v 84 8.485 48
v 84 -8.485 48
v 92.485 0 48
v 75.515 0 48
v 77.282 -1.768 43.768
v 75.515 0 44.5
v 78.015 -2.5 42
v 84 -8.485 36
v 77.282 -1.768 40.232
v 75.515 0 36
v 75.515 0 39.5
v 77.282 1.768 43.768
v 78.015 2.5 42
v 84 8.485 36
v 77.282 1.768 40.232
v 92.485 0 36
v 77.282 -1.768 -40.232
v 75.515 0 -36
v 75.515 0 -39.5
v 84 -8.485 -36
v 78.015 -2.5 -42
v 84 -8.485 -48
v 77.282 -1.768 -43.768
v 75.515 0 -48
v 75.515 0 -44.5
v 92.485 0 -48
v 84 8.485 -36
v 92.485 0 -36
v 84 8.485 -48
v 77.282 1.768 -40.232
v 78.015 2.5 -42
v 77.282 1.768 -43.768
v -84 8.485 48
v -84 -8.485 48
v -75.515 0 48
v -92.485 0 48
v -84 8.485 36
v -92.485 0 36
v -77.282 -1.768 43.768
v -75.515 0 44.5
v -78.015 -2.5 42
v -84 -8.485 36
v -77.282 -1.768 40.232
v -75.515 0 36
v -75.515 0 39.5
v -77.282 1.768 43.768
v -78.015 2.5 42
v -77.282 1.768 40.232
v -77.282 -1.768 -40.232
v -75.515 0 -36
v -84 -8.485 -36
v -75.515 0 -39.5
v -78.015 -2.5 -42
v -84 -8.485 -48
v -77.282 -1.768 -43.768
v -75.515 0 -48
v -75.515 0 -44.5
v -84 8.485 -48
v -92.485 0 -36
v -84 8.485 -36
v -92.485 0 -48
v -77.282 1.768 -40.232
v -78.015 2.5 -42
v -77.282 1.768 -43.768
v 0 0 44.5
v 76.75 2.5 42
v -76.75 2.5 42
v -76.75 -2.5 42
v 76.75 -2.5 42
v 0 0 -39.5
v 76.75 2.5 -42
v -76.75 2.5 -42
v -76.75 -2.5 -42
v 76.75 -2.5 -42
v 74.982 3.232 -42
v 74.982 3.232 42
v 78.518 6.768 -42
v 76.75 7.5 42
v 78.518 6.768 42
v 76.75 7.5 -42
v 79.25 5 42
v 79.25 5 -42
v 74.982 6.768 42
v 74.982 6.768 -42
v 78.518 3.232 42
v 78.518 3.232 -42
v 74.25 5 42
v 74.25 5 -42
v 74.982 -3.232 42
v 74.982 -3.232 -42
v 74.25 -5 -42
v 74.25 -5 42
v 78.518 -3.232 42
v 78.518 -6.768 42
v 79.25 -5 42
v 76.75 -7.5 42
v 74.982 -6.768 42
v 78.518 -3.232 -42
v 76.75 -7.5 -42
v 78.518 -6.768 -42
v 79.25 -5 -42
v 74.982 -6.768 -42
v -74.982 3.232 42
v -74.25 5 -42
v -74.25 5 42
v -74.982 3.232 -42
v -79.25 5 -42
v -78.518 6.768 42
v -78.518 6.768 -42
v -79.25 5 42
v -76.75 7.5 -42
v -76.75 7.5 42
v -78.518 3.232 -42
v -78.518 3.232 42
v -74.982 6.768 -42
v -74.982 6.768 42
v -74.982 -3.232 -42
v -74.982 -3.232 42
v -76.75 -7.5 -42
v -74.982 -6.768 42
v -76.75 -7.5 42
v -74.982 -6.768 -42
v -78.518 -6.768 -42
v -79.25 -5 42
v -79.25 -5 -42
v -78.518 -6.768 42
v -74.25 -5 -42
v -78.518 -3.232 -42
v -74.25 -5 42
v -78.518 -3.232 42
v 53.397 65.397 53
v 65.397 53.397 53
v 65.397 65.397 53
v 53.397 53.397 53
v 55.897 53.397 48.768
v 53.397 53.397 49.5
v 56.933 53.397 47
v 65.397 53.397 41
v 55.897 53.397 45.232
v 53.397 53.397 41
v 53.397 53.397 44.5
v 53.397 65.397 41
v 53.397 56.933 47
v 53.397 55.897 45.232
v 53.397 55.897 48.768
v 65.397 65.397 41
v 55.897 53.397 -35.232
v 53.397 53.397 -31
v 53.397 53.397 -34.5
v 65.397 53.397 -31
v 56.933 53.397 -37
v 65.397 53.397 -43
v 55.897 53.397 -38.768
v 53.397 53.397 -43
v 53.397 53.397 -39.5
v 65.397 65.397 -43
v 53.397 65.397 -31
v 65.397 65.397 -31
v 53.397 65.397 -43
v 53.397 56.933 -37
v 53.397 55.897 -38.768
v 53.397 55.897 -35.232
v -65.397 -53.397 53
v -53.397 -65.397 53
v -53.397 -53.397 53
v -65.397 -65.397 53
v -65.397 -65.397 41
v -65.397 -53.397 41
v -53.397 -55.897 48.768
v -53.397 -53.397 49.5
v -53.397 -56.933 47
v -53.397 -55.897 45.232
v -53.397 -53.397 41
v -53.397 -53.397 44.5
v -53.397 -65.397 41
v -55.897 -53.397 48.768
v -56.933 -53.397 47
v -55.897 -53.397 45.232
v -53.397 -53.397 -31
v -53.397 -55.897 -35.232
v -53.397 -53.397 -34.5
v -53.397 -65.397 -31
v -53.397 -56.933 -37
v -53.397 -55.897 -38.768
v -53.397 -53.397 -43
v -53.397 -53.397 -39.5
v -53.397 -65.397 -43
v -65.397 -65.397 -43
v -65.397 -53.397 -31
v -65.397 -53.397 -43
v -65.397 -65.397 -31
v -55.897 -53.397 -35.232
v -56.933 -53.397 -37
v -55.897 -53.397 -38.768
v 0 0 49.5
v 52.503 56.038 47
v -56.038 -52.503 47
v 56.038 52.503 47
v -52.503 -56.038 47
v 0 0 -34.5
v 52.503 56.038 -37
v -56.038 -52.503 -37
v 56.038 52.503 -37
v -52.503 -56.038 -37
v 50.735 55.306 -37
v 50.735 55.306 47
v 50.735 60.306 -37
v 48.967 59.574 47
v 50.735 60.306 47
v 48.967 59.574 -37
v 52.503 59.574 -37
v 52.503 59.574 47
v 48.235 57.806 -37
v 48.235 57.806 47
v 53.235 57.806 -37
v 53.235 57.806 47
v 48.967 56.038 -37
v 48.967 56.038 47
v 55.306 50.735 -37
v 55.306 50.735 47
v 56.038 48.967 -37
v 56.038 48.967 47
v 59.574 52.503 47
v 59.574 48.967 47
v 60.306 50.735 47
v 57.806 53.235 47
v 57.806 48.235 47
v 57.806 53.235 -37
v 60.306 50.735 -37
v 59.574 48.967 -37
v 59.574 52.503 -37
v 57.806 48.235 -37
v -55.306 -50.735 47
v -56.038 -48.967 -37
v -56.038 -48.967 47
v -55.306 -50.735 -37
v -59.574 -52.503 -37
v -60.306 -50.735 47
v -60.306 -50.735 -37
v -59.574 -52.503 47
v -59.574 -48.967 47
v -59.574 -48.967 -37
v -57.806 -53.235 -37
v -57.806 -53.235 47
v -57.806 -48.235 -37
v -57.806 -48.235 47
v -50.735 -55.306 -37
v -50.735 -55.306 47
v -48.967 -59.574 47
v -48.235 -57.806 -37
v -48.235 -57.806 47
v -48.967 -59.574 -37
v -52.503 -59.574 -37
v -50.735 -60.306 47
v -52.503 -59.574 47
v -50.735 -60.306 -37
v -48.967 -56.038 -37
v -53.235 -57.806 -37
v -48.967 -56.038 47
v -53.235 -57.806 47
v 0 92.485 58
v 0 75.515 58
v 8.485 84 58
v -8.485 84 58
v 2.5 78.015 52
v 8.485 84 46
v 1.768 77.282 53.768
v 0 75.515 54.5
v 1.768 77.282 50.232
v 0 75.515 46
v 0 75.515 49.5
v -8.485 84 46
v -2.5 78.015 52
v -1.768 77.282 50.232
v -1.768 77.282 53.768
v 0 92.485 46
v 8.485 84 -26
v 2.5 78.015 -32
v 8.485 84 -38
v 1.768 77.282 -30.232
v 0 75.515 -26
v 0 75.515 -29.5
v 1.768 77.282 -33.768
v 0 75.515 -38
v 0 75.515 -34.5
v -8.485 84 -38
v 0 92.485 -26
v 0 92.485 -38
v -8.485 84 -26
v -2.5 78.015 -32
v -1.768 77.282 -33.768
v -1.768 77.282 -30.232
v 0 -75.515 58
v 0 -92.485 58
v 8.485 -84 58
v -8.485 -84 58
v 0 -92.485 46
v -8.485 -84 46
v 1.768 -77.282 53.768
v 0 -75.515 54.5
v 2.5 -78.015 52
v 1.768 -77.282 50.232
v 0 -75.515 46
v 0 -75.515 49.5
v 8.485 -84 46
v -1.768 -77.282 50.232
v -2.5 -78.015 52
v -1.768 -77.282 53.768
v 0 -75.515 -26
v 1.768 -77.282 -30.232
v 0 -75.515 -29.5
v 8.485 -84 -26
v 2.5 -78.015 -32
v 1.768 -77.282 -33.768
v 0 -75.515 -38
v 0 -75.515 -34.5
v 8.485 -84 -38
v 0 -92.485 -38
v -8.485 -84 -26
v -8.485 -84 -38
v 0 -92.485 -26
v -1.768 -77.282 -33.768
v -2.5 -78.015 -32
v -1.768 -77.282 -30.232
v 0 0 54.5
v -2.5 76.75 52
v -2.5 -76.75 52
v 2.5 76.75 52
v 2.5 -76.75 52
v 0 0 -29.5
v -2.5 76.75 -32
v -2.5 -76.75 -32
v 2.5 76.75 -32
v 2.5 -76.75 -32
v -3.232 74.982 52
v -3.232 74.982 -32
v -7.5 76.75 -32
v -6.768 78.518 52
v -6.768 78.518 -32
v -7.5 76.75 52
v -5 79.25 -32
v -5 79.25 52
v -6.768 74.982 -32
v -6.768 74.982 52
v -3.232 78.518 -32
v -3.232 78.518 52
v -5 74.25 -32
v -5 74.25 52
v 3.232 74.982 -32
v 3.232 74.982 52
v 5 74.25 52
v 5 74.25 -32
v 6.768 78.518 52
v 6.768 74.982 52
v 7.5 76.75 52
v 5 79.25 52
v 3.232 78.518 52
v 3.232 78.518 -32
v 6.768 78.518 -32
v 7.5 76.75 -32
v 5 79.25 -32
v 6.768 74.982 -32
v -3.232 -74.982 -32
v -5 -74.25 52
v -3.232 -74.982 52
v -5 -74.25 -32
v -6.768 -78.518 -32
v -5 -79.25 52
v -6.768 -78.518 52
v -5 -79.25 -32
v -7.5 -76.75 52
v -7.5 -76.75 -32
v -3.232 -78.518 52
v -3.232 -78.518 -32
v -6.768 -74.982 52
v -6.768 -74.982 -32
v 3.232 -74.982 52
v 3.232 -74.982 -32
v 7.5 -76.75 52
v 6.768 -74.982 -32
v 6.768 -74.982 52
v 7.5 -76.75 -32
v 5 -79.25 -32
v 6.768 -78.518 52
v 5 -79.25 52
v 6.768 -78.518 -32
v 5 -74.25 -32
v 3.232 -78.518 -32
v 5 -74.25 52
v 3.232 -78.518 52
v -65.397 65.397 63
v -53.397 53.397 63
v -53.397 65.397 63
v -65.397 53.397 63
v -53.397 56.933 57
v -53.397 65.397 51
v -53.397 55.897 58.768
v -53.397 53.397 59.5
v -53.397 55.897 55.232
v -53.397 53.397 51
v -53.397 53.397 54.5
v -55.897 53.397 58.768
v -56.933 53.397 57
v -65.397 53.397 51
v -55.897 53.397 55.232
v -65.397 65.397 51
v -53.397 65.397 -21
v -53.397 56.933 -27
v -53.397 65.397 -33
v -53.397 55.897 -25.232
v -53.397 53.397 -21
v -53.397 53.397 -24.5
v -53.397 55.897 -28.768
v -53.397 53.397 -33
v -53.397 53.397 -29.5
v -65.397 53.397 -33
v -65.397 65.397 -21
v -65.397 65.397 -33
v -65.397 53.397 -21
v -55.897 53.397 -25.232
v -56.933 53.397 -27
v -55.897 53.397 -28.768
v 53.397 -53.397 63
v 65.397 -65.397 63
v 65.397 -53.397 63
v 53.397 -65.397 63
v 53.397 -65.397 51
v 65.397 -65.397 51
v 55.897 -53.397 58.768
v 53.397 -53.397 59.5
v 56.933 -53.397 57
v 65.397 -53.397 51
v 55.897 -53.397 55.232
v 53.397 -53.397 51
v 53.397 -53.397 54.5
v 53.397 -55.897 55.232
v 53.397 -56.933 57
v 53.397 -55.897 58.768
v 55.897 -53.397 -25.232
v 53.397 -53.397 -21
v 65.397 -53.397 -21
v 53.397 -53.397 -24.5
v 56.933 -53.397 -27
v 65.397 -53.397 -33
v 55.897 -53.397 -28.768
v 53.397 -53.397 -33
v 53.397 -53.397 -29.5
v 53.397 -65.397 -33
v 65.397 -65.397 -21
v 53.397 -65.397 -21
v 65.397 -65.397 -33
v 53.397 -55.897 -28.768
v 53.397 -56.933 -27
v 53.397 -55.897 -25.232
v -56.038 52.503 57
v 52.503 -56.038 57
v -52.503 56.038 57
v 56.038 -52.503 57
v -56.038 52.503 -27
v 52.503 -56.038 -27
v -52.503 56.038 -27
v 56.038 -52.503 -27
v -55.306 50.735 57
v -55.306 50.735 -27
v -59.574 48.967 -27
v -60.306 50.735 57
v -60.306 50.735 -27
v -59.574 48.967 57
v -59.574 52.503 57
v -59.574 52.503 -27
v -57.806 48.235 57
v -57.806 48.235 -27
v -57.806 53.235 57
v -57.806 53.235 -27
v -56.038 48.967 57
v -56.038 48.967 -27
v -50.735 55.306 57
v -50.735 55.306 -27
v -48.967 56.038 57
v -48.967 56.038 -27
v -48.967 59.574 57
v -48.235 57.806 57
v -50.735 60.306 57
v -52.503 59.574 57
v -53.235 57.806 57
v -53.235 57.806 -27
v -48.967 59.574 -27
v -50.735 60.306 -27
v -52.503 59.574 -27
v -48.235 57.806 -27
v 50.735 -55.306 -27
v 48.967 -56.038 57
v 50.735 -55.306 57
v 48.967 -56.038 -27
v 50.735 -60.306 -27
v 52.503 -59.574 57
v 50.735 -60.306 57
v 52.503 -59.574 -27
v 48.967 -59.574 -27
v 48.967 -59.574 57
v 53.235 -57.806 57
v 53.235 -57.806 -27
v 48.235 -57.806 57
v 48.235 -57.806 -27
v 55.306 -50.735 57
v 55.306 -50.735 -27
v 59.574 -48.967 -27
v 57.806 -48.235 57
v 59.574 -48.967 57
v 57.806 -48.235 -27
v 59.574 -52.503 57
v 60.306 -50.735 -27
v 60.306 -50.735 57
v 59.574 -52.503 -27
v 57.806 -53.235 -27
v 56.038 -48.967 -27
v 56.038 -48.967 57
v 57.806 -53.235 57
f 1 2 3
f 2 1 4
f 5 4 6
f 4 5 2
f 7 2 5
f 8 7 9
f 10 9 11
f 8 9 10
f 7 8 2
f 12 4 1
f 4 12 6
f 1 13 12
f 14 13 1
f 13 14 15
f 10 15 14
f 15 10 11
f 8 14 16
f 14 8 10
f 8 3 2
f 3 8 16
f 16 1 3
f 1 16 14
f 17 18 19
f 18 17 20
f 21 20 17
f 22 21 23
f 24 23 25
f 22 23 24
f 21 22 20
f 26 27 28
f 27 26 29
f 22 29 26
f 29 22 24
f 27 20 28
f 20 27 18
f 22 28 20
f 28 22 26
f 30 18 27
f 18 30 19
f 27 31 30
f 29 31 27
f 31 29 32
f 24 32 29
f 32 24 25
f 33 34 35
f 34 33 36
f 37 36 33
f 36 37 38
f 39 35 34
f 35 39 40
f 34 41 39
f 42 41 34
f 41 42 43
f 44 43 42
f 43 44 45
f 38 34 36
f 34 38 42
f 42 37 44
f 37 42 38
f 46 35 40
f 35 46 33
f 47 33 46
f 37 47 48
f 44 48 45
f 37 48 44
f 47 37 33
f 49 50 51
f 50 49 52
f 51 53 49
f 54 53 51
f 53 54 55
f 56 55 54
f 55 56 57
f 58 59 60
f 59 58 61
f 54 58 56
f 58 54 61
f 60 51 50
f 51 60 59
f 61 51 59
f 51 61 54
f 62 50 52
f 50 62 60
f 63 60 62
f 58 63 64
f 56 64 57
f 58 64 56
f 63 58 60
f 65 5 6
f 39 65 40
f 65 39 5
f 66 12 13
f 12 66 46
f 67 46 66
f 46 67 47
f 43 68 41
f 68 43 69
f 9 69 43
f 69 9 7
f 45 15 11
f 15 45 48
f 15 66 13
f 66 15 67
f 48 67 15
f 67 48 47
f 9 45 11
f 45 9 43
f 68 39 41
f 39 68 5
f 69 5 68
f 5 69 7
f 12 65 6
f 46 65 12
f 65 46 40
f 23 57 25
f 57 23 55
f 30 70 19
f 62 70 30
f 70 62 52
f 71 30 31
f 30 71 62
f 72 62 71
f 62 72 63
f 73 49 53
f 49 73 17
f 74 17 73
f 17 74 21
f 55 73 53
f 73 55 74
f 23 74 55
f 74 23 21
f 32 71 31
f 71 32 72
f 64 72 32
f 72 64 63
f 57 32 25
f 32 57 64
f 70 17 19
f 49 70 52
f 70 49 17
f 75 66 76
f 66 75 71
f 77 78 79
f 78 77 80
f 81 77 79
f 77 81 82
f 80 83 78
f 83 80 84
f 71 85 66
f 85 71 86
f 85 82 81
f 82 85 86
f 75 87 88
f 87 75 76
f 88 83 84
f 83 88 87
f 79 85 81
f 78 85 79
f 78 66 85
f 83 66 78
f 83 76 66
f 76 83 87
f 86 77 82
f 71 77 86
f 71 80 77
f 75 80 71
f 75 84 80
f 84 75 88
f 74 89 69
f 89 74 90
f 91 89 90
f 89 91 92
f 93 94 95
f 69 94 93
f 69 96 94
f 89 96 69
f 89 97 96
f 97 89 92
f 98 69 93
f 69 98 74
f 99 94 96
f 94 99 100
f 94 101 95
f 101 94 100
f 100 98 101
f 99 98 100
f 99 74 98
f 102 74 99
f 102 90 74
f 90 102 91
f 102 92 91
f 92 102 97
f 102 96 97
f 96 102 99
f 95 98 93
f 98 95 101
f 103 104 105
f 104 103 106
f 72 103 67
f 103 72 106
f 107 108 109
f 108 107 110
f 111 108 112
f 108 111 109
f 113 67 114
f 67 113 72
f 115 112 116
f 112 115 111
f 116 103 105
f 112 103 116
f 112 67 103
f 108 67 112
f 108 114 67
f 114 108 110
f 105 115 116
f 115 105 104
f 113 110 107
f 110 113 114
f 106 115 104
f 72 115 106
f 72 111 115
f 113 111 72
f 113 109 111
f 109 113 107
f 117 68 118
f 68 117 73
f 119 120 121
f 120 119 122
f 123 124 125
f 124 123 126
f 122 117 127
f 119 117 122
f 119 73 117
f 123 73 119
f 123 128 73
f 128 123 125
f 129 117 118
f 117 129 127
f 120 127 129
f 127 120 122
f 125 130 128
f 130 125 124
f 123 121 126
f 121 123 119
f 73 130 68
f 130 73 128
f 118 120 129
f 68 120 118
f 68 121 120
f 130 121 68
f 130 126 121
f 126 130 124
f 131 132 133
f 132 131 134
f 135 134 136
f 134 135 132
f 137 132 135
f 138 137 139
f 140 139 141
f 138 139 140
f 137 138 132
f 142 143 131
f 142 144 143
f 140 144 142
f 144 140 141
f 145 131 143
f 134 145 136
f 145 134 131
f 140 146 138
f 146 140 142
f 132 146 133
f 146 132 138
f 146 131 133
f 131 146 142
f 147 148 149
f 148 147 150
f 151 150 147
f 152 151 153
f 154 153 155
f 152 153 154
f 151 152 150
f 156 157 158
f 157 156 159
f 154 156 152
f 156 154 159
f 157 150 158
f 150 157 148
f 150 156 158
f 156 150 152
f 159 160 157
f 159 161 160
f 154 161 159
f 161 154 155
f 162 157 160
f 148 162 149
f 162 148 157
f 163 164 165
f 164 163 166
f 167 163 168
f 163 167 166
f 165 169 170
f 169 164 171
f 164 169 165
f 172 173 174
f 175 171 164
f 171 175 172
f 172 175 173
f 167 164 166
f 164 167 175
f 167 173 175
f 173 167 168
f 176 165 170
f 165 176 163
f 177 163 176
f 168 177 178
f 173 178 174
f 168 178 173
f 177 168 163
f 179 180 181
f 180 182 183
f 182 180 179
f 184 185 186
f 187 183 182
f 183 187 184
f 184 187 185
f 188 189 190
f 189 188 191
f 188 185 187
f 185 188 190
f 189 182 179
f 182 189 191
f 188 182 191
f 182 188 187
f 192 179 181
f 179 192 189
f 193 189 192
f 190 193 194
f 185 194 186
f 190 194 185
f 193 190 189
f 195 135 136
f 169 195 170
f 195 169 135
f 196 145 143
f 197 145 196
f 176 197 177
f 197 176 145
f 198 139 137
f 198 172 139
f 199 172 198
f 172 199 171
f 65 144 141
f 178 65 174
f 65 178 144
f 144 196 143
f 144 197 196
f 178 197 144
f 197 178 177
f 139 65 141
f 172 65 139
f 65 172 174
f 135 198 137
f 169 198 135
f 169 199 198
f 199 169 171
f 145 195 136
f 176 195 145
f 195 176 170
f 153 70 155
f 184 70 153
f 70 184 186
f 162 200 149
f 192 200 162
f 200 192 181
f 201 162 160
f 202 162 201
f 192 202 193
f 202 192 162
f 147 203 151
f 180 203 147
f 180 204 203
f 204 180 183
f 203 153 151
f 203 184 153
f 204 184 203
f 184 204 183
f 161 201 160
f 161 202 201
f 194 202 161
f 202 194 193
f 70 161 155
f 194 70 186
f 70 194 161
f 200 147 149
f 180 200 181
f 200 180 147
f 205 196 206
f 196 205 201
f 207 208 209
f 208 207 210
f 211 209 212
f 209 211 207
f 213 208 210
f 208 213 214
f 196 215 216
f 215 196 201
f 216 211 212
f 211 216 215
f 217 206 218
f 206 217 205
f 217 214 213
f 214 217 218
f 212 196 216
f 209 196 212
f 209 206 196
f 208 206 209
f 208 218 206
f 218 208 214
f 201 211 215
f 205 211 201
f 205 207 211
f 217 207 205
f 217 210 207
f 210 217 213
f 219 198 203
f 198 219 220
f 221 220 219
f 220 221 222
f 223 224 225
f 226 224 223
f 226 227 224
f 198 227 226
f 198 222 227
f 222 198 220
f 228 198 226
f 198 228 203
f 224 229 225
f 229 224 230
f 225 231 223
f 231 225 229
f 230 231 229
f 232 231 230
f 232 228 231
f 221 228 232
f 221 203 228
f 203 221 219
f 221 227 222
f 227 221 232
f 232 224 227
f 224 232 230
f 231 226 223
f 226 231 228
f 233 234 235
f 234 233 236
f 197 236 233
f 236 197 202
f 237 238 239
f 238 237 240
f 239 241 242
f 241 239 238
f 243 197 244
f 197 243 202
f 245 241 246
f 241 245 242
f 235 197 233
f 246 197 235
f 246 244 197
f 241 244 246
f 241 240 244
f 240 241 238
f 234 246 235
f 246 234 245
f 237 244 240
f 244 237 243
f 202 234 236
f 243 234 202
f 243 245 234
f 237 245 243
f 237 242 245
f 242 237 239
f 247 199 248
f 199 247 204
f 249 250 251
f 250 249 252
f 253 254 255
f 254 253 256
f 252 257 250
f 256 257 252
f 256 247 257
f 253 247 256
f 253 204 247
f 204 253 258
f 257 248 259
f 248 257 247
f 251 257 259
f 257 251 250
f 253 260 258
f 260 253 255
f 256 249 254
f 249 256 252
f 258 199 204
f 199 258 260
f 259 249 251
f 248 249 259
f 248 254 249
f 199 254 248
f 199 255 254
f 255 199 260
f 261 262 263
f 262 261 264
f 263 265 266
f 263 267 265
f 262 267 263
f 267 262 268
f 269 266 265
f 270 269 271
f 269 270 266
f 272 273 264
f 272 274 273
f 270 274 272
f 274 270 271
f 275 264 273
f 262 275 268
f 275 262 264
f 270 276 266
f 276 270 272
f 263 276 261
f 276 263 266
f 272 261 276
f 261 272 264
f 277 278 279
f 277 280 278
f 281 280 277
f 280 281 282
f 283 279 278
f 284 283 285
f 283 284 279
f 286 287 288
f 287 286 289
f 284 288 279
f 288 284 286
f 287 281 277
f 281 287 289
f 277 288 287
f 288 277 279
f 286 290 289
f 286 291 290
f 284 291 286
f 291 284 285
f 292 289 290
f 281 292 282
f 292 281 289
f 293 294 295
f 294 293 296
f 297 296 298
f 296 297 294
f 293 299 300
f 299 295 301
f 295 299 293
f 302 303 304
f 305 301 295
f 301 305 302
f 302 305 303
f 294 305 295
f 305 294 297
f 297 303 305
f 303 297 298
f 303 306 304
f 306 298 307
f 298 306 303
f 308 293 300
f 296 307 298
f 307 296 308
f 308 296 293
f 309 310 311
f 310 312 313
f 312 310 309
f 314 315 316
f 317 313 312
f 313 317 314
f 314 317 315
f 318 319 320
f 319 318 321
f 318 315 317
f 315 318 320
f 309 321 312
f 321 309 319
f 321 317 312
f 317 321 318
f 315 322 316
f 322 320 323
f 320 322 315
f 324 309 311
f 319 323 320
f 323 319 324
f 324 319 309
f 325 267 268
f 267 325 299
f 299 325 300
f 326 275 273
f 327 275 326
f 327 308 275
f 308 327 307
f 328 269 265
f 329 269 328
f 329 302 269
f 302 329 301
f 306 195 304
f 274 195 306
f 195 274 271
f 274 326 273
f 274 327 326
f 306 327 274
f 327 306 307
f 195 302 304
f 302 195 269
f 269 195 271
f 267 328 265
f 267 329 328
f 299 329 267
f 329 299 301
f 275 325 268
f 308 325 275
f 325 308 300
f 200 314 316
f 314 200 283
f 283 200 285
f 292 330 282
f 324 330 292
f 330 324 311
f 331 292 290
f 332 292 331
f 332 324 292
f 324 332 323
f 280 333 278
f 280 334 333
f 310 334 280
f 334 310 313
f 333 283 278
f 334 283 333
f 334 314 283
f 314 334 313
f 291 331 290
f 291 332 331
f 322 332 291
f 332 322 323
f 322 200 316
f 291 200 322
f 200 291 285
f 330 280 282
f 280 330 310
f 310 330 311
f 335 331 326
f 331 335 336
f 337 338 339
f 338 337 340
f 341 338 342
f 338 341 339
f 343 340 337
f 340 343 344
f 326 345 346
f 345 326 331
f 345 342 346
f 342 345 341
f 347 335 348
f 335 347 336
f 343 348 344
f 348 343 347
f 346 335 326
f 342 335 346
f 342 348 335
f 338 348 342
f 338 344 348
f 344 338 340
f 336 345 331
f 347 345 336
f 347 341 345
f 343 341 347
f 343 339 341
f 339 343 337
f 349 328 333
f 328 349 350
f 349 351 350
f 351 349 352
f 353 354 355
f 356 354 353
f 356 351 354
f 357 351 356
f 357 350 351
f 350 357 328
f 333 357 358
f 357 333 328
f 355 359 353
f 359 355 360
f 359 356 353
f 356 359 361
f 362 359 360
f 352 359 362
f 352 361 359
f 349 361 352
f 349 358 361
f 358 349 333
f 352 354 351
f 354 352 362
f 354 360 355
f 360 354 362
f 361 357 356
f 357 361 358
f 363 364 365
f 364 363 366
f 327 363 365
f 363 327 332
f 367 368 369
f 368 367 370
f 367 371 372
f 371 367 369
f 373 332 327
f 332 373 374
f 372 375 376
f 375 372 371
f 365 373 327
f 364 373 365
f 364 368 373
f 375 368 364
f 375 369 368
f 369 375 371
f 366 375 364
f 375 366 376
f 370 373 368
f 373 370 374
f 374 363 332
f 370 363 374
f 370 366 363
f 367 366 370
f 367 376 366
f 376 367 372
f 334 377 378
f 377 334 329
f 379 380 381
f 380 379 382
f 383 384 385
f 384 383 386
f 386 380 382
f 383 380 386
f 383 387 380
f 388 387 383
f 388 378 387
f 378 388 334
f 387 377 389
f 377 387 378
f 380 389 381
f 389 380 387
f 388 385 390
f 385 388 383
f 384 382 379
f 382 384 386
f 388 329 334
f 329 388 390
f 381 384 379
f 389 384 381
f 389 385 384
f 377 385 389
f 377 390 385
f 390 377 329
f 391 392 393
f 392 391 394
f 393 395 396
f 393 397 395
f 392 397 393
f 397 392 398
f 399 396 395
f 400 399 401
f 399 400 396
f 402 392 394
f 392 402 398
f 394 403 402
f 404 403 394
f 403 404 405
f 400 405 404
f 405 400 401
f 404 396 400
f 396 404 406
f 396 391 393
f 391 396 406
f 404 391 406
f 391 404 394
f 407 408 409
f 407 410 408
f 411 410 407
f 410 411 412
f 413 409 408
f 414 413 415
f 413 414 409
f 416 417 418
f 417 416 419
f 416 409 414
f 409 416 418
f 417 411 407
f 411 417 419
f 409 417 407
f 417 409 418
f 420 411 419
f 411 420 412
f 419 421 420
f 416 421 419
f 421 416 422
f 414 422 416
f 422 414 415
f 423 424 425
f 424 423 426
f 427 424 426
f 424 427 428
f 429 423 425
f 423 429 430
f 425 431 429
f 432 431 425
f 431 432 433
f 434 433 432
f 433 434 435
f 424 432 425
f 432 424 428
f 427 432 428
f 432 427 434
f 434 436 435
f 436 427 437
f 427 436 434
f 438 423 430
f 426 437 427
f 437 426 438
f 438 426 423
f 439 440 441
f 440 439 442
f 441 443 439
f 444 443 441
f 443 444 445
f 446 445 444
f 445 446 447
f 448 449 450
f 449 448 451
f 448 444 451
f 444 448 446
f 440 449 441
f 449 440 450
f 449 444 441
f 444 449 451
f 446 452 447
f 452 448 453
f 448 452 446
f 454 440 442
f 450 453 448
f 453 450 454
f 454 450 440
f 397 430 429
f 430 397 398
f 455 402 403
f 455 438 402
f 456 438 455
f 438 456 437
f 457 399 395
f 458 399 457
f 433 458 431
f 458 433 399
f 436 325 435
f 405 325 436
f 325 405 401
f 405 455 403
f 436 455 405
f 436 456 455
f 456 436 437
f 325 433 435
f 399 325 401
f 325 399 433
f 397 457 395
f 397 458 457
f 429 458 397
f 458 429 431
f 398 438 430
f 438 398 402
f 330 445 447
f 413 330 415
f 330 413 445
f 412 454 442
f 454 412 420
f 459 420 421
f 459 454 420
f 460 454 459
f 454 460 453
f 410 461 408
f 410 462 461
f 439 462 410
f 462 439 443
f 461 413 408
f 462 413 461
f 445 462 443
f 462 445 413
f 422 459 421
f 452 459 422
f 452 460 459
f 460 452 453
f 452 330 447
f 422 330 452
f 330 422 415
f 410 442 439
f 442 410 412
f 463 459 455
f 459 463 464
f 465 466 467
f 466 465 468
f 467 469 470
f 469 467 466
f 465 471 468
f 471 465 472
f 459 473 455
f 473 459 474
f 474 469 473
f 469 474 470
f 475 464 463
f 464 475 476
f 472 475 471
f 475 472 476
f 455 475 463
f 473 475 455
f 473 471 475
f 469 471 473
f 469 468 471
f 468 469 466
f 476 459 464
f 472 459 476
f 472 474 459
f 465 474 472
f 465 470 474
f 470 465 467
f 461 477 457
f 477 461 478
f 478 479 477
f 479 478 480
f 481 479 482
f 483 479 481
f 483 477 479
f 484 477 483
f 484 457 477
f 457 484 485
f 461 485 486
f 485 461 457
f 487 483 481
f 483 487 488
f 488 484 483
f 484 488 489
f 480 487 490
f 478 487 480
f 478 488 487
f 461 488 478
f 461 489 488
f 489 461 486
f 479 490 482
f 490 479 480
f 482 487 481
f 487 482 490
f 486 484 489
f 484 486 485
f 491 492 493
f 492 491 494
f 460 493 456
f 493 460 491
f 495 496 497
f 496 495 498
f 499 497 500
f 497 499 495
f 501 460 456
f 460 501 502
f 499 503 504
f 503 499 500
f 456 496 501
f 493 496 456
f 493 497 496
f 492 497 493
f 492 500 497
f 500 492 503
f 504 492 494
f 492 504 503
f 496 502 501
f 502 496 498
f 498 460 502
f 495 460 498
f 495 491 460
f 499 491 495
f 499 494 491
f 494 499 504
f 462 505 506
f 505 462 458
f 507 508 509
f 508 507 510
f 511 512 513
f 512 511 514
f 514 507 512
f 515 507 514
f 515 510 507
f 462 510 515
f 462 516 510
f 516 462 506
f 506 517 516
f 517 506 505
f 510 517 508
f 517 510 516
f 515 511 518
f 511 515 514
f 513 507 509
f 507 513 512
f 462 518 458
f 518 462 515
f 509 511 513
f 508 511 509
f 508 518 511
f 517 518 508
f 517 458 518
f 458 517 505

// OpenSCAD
thick = 12;
rad = 36;
wall = 12;

echo(acos((rad-wall)/rad)/180/3.14159);


echo((thick * (rad*rad * (3.14159/180) * acos((rad-wall)/rad)-(rad-wall)*sqrt(2*wall*rad-wall*wall))) / (12*12*12) );


num_boxes = 8;
rad = 7*12;
box_x = 12;
box_y = 12;
box_z = 12;
tube_rad = 2.5;

//stride is half of the radius with 6 boxes.
echo(rad);
echo(rad * sin(180/num_boxes));

for(i=[0:360/num_boxes:179]) rotate([0,0,i]) {
    translate([0,0,i/(360/num_boxes) * tube_rad*2]){
        //boxes
        for(j=[0,1]) for(k=[0,1]) mirror([j,0,0]) mirror([0,0,k]) translate([rad,0,rad/2]) rotate([0,0,45]) cube([box_x, box_y, box_z], center=true);
            
        //end tube
        for(k=[0,1]) mirror([0,0,k]) translate([0,0,rad/2]) rotate([0,90,0]) cylinder(r=tube_rad, h=rad*2, center=true);
        
        //connecting tubes
        for(j=[0,1]) for(k=[0,1]) mirror([j,0,0]) mirror([0,k,0]) translate([rad-box_x/2-tube_rad/2,tube_rad*2,0]) cylinder(r=tube_rad, h=rad, center=true);
    }
    
}
